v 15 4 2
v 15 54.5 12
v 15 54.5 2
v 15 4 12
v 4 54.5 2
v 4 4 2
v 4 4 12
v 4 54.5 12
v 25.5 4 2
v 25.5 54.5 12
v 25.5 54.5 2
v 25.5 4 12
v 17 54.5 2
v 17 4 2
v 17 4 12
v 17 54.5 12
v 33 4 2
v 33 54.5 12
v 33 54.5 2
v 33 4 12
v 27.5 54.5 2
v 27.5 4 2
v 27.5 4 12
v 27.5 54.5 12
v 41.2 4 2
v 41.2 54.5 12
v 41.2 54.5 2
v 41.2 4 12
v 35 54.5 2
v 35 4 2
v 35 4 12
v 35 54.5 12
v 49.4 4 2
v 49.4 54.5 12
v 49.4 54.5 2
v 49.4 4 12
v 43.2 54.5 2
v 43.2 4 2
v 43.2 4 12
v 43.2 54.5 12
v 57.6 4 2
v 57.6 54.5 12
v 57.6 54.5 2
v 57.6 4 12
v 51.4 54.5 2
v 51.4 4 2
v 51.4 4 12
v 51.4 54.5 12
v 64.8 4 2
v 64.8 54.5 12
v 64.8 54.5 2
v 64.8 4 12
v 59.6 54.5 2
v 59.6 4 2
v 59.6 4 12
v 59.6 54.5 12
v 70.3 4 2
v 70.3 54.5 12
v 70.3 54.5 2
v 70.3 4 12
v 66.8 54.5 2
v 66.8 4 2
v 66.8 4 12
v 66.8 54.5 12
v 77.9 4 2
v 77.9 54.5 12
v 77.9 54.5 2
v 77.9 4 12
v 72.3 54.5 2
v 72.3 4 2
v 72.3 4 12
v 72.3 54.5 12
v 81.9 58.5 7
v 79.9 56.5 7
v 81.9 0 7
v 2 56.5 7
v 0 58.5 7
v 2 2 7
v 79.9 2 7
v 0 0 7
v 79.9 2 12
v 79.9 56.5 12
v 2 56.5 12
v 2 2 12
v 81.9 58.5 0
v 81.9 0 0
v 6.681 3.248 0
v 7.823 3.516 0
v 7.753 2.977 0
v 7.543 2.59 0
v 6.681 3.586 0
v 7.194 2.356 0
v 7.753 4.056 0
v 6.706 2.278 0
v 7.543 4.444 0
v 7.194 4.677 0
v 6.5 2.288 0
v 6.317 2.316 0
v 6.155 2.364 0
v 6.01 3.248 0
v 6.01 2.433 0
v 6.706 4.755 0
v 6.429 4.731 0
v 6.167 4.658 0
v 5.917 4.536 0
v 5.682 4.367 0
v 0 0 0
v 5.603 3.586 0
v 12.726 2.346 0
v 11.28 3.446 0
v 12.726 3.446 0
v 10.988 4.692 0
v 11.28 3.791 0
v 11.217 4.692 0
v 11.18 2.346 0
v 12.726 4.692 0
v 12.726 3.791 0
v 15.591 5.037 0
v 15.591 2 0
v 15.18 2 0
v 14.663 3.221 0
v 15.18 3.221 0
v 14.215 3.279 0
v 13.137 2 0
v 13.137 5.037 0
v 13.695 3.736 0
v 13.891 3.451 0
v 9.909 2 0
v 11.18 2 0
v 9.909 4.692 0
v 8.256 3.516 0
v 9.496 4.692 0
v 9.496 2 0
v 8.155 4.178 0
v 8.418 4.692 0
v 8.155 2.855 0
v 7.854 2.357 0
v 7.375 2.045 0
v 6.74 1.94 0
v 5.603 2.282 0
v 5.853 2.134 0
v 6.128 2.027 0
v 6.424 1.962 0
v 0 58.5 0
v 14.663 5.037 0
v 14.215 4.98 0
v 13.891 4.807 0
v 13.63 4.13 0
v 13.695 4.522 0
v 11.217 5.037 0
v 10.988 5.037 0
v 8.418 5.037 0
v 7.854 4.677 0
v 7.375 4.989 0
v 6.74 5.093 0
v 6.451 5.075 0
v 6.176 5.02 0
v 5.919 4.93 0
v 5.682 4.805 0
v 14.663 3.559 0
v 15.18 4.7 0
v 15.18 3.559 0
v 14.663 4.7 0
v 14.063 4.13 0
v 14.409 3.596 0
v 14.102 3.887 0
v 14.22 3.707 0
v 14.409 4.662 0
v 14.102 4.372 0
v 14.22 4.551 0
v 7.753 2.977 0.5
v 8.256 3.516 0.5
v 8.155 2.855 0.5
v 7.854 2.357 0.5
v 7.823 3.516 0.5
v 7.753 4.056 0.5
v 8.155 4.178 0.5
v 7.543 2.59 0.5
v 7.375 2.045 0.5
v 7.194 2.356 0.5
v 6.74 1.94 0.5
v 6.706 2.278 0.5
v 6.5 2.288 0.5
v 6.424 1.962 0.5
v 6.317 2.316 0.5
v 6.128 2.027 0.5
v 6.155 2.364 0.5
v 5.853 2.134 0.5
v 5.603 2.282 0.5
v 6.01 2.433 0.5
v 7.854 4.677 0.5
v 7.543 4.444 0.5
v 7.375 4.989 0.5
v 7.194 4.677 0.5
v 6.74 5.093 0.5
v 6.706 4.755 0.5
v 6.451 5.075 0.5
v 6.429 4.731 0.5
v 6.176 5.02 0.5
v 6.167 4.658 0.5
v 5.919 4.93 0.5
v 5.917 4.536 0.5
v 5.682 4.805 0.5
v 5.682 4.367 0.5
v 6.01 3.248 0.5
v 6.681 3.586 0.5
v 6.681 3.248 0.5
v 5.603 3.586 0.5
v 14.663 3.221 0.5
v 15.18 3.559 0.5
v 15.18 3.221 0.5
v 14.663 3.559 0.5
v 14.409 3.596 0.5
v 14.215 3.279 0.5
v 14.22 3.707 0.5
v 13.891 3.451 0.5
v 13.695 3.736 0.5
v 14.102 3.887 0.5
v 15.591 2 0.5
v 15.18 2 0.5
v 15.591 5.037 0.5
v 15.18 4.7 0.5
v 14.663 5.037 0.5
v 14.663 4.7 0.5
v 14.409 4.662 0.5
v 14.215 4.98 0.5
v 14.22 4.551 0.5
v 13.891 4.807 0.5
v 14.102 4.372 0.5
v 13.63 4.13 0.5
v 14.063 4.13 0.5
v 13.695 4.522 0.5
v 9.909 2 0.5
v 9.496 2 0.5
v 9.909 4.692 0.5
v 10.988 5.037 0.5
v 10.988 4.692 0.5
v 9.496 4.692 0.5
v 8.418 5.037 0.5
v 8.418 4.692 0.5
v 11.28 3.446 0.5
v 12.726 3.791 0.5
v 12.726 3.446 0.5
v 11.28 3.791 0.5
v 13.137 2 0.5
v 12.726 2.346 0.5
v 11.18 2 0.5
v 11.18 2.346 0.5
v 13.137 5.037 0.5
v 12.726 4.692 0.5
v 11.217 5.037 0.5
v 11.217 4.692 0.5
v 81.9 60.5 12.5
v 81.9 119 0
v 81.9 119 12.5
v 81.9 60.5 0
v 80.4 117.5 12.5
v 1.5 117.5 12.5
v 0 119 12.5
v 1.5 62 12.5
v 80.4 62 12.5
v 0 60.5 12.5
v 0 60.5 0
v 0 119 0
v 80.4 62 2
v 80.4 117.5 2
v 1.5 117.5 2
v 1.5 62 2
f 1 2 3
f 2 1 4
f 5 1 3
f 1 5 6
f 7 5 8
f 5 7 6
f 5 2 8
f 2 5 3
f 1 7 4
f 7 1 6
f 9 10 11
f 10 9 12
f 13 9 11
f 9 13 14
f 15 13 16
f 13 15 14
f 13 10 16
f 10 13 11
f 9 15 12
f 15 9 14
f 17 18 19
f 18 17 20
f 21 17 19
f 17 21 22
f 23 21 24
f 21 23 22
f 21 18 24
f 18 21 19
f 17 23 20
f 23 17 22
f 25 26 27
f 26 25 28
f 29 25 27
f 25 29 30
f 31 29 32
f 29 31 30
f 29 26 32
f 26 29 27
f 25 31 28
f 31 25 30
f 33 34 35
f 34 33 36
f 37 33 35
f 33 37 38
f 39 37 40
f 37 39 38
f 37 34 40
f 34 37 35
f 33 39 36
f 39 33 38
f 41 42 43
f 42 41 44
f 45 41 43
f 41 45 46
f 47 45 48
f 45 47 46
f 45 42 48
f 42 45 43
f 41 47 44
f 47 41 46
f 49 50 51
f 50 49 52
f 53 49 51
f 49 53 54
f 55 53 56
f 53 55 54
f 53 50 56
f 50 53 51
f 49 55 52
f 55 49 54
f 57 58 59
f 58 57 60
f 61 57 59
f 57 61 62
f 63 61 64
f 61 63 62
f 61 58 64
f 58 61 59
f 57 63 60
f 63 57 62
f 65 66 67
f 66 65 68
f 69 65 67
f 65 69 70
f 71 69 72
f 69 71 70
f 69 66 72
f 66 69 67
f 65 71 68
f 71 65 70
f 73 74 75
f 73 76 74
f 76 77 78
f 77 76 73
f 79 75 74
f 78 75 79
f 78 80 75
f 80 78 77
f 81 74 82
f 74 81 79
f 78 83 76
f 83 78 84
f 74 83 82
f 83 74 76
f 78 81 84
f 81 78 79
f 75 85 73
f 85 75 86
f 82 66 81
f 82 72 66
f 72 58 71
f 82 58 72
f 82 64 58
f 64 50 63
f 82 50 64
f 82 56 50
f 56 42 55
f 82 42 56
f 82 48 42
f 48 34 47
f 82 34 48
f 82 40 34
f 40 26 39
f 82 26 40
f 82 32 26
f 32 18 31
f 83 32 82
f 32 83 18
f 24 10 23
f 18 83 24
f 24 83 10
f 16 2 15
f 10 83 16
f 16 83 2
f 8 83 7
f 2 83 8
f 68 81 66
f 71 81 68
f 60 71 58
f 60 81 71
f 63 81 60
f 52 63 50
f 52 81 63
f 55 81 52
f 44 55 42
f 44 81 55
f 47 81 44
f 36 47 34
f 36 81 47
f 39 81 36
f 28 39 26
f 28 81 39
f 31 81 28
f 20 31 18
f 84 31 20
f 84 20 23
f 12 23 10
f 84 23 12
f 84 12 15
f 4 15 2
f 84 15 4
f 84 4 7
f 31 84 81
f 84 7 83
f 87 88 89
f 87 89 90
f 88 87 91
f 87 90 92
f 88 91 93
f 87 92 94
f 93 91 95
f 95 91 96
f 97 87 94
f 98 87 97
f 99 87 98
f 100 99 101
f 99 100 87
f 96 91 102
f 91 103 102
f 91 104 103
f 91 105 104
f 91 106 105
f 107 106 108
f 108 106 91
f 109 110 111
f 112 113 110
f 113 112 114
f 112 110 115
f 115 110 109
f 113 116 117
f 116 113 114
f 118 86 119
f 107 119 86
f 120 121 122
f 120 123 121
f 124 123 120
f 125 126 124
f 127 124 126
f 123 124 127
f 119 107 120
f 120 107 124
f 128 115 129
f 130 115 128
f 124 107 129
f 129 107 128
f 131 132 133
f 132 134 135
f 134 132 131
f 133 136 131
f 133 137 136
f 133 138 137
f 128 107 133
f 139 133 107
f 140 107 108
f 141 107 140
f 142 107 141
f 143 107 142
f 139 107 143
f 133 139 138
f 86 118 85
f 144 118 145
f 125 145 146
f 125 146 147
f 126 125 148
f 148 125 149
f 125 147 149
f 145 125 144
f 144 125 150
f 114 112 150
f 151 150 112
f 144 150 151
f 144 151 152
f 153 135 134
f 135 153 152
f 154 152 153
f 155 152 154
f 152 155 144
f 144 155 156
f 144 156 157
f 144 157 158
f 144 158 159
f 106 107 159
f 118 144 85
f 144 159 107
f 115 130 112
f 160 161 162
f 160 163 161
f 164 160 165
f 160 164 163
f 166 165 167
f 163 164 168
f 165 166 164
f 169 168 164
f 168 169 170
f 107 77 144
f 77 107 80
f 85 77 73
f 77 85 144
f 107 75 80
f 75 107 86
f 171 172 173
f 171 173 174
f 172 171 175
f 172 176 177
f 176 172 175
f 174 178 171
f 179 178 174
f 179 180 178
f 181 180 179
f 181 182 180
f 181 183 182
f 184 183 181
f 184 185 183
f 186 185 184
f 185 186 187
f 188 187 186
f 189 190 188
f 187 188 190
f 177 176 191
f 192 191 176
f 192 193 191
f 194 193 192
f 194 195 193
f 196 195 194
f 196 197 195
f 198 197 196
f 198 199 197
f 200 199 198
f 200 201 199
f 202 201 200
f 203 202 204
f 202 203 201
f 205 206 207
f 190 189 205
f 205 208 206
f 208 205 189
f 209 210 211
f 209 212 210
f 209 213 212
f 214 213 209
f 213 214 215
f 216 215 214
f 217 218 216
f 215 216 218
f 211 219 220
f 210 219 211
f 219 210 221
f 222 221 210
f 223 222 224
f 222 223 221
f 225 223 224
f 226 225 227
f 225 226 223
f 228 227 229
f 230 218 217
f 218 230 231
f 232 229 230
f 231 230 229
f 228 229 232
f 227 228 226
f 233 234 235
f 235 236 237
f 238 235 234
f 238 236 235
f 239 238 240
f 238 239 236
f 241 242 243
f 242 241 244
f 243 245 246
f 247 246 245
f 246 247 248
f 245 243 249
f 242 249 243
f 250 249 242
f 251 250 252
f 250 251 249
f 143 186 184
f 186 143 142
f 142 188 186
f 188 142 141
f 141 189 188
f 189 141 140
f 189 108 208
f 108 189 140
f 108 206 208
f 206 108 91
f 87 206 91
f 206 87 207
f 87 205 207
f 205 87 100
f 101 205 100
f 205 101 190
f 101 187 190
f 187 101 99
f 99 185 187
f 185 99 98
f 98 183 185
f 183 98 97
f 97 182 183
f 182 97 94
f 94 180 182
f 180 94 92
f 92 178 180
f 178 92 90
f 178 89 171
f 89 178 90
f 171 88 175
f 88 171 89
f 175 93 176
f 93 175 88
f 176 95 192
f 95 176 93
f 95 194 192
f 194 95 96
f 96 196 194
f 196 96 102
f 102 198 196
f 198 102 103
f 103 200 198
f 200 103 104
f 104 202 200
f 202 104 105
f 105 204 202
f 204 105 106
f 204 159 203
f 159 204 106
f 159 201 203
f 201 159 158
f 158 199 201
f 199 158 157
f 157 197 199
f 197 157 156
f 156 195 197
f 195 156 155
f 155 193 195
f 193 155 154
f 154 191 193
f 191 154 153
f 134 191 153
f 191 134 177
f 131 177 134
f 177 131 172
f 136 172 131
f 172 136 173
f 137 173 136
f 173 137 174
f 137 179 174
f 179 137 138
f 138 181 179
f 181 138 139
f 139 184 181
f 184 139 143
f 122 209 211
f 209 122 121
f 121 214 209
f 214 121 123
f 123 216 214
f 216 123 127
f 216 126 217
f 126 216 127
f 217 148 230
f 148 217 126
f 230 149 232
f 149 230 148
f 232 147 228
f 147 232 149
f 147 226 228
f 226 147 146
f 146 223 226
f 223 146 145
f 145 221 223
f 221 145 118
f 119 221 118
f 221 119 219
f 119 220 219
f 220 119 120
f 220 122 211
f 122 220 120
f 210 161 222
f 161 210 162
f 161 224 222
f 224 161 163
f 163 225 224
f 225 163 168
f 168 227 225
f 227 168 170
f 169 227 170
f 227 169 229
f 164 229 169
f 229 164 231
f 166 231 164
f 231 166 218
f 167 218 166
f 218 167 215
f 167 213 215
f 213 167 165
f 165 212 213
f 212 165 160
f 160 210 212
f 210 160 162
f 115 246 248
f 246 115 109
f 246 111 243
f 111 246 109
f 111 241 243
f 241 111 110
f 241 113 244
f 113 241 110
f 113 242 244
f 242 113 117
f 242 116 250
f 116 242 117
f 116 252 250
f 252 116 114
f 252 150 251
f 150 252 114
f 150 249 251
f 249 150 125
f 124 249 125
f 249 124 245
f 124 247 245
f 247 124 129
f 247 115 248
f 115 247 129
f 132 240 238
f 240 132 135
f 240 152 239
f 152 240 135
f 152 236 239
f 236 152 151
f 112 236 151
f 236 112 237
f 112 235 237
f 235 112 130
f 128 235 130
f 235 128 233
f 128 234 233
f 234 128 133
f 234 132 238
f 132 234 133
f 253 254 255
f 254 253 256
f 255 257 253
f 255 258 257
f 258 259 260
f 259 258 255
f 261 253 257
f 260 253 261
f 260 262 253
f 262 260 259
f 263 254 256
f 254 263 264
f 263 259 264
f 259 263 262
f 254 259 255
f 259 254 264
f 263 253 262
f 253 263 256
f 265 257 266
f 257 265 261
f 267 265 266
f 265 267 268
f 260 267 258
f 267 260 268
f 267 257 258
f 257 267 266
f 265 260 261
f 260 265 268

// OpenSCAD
/*[ Storage box for a set of optical filters ]*/

// label on the bottom
label = "PETG";

// filter depth
depth = 10;

// filter length
length = 50.5;

// filter widths
widths = [
    11,
    8.5,
    5.5,
    6.2,
    6.2,
    6.2,
    5.2,
    3.5,
    5.6
];

// inner height of the lid
lid_height = 10.5;

// gap between the box and the lid
lid_gap = 0.5;


function sum_widths(v, i = 0, r = 4) = i < len(v) ? sum_widths(v, i+1, v[i] + r + 2) : r;
function sum_widths_until(v, l, i = 0, r = 4) = i < l ? sum_widths_until(v, l, i+1, v[i] + r + 2) : r;

tray_width = sum_widths(widths) + 2;

module box(){
    difference(){
        cube([tray_width, length + 8, depth + 2]);
        
        for(i = [0 : len(widths) - 1]){
            translate([sum_widths_until(widths, i), 4, 2]) cube([widths[i], length, depth + 1]);
        }
        
        translate([16, 2, -0.5]) mirror([1, 0, 0]) linear_extrude(1) text(label, size = 3, font="DejaVu Sans");
        
        translate([0, 0, depth - 3]) difference(){
            translate([-1, -1, 0]) cube([tray_width + 2, length + 10, depth]); 
            translate([2, 2, -1]) cube([tray_width - 4, length + 4, depth + 2]);
        }
    }   
}

module lid(){
    difference(){
        cube([tray_width, length + 8, lid_height + 2]);
        translate([2 - lid_gap, 2 - lid_gap, 2]) cube([tray_width - 4 + 2 * lid_gap, length + 4 + 2 * lid_gap, lid_height + 1]);
    }
}

box();
translate([0, length + 10, 0]) lid();
